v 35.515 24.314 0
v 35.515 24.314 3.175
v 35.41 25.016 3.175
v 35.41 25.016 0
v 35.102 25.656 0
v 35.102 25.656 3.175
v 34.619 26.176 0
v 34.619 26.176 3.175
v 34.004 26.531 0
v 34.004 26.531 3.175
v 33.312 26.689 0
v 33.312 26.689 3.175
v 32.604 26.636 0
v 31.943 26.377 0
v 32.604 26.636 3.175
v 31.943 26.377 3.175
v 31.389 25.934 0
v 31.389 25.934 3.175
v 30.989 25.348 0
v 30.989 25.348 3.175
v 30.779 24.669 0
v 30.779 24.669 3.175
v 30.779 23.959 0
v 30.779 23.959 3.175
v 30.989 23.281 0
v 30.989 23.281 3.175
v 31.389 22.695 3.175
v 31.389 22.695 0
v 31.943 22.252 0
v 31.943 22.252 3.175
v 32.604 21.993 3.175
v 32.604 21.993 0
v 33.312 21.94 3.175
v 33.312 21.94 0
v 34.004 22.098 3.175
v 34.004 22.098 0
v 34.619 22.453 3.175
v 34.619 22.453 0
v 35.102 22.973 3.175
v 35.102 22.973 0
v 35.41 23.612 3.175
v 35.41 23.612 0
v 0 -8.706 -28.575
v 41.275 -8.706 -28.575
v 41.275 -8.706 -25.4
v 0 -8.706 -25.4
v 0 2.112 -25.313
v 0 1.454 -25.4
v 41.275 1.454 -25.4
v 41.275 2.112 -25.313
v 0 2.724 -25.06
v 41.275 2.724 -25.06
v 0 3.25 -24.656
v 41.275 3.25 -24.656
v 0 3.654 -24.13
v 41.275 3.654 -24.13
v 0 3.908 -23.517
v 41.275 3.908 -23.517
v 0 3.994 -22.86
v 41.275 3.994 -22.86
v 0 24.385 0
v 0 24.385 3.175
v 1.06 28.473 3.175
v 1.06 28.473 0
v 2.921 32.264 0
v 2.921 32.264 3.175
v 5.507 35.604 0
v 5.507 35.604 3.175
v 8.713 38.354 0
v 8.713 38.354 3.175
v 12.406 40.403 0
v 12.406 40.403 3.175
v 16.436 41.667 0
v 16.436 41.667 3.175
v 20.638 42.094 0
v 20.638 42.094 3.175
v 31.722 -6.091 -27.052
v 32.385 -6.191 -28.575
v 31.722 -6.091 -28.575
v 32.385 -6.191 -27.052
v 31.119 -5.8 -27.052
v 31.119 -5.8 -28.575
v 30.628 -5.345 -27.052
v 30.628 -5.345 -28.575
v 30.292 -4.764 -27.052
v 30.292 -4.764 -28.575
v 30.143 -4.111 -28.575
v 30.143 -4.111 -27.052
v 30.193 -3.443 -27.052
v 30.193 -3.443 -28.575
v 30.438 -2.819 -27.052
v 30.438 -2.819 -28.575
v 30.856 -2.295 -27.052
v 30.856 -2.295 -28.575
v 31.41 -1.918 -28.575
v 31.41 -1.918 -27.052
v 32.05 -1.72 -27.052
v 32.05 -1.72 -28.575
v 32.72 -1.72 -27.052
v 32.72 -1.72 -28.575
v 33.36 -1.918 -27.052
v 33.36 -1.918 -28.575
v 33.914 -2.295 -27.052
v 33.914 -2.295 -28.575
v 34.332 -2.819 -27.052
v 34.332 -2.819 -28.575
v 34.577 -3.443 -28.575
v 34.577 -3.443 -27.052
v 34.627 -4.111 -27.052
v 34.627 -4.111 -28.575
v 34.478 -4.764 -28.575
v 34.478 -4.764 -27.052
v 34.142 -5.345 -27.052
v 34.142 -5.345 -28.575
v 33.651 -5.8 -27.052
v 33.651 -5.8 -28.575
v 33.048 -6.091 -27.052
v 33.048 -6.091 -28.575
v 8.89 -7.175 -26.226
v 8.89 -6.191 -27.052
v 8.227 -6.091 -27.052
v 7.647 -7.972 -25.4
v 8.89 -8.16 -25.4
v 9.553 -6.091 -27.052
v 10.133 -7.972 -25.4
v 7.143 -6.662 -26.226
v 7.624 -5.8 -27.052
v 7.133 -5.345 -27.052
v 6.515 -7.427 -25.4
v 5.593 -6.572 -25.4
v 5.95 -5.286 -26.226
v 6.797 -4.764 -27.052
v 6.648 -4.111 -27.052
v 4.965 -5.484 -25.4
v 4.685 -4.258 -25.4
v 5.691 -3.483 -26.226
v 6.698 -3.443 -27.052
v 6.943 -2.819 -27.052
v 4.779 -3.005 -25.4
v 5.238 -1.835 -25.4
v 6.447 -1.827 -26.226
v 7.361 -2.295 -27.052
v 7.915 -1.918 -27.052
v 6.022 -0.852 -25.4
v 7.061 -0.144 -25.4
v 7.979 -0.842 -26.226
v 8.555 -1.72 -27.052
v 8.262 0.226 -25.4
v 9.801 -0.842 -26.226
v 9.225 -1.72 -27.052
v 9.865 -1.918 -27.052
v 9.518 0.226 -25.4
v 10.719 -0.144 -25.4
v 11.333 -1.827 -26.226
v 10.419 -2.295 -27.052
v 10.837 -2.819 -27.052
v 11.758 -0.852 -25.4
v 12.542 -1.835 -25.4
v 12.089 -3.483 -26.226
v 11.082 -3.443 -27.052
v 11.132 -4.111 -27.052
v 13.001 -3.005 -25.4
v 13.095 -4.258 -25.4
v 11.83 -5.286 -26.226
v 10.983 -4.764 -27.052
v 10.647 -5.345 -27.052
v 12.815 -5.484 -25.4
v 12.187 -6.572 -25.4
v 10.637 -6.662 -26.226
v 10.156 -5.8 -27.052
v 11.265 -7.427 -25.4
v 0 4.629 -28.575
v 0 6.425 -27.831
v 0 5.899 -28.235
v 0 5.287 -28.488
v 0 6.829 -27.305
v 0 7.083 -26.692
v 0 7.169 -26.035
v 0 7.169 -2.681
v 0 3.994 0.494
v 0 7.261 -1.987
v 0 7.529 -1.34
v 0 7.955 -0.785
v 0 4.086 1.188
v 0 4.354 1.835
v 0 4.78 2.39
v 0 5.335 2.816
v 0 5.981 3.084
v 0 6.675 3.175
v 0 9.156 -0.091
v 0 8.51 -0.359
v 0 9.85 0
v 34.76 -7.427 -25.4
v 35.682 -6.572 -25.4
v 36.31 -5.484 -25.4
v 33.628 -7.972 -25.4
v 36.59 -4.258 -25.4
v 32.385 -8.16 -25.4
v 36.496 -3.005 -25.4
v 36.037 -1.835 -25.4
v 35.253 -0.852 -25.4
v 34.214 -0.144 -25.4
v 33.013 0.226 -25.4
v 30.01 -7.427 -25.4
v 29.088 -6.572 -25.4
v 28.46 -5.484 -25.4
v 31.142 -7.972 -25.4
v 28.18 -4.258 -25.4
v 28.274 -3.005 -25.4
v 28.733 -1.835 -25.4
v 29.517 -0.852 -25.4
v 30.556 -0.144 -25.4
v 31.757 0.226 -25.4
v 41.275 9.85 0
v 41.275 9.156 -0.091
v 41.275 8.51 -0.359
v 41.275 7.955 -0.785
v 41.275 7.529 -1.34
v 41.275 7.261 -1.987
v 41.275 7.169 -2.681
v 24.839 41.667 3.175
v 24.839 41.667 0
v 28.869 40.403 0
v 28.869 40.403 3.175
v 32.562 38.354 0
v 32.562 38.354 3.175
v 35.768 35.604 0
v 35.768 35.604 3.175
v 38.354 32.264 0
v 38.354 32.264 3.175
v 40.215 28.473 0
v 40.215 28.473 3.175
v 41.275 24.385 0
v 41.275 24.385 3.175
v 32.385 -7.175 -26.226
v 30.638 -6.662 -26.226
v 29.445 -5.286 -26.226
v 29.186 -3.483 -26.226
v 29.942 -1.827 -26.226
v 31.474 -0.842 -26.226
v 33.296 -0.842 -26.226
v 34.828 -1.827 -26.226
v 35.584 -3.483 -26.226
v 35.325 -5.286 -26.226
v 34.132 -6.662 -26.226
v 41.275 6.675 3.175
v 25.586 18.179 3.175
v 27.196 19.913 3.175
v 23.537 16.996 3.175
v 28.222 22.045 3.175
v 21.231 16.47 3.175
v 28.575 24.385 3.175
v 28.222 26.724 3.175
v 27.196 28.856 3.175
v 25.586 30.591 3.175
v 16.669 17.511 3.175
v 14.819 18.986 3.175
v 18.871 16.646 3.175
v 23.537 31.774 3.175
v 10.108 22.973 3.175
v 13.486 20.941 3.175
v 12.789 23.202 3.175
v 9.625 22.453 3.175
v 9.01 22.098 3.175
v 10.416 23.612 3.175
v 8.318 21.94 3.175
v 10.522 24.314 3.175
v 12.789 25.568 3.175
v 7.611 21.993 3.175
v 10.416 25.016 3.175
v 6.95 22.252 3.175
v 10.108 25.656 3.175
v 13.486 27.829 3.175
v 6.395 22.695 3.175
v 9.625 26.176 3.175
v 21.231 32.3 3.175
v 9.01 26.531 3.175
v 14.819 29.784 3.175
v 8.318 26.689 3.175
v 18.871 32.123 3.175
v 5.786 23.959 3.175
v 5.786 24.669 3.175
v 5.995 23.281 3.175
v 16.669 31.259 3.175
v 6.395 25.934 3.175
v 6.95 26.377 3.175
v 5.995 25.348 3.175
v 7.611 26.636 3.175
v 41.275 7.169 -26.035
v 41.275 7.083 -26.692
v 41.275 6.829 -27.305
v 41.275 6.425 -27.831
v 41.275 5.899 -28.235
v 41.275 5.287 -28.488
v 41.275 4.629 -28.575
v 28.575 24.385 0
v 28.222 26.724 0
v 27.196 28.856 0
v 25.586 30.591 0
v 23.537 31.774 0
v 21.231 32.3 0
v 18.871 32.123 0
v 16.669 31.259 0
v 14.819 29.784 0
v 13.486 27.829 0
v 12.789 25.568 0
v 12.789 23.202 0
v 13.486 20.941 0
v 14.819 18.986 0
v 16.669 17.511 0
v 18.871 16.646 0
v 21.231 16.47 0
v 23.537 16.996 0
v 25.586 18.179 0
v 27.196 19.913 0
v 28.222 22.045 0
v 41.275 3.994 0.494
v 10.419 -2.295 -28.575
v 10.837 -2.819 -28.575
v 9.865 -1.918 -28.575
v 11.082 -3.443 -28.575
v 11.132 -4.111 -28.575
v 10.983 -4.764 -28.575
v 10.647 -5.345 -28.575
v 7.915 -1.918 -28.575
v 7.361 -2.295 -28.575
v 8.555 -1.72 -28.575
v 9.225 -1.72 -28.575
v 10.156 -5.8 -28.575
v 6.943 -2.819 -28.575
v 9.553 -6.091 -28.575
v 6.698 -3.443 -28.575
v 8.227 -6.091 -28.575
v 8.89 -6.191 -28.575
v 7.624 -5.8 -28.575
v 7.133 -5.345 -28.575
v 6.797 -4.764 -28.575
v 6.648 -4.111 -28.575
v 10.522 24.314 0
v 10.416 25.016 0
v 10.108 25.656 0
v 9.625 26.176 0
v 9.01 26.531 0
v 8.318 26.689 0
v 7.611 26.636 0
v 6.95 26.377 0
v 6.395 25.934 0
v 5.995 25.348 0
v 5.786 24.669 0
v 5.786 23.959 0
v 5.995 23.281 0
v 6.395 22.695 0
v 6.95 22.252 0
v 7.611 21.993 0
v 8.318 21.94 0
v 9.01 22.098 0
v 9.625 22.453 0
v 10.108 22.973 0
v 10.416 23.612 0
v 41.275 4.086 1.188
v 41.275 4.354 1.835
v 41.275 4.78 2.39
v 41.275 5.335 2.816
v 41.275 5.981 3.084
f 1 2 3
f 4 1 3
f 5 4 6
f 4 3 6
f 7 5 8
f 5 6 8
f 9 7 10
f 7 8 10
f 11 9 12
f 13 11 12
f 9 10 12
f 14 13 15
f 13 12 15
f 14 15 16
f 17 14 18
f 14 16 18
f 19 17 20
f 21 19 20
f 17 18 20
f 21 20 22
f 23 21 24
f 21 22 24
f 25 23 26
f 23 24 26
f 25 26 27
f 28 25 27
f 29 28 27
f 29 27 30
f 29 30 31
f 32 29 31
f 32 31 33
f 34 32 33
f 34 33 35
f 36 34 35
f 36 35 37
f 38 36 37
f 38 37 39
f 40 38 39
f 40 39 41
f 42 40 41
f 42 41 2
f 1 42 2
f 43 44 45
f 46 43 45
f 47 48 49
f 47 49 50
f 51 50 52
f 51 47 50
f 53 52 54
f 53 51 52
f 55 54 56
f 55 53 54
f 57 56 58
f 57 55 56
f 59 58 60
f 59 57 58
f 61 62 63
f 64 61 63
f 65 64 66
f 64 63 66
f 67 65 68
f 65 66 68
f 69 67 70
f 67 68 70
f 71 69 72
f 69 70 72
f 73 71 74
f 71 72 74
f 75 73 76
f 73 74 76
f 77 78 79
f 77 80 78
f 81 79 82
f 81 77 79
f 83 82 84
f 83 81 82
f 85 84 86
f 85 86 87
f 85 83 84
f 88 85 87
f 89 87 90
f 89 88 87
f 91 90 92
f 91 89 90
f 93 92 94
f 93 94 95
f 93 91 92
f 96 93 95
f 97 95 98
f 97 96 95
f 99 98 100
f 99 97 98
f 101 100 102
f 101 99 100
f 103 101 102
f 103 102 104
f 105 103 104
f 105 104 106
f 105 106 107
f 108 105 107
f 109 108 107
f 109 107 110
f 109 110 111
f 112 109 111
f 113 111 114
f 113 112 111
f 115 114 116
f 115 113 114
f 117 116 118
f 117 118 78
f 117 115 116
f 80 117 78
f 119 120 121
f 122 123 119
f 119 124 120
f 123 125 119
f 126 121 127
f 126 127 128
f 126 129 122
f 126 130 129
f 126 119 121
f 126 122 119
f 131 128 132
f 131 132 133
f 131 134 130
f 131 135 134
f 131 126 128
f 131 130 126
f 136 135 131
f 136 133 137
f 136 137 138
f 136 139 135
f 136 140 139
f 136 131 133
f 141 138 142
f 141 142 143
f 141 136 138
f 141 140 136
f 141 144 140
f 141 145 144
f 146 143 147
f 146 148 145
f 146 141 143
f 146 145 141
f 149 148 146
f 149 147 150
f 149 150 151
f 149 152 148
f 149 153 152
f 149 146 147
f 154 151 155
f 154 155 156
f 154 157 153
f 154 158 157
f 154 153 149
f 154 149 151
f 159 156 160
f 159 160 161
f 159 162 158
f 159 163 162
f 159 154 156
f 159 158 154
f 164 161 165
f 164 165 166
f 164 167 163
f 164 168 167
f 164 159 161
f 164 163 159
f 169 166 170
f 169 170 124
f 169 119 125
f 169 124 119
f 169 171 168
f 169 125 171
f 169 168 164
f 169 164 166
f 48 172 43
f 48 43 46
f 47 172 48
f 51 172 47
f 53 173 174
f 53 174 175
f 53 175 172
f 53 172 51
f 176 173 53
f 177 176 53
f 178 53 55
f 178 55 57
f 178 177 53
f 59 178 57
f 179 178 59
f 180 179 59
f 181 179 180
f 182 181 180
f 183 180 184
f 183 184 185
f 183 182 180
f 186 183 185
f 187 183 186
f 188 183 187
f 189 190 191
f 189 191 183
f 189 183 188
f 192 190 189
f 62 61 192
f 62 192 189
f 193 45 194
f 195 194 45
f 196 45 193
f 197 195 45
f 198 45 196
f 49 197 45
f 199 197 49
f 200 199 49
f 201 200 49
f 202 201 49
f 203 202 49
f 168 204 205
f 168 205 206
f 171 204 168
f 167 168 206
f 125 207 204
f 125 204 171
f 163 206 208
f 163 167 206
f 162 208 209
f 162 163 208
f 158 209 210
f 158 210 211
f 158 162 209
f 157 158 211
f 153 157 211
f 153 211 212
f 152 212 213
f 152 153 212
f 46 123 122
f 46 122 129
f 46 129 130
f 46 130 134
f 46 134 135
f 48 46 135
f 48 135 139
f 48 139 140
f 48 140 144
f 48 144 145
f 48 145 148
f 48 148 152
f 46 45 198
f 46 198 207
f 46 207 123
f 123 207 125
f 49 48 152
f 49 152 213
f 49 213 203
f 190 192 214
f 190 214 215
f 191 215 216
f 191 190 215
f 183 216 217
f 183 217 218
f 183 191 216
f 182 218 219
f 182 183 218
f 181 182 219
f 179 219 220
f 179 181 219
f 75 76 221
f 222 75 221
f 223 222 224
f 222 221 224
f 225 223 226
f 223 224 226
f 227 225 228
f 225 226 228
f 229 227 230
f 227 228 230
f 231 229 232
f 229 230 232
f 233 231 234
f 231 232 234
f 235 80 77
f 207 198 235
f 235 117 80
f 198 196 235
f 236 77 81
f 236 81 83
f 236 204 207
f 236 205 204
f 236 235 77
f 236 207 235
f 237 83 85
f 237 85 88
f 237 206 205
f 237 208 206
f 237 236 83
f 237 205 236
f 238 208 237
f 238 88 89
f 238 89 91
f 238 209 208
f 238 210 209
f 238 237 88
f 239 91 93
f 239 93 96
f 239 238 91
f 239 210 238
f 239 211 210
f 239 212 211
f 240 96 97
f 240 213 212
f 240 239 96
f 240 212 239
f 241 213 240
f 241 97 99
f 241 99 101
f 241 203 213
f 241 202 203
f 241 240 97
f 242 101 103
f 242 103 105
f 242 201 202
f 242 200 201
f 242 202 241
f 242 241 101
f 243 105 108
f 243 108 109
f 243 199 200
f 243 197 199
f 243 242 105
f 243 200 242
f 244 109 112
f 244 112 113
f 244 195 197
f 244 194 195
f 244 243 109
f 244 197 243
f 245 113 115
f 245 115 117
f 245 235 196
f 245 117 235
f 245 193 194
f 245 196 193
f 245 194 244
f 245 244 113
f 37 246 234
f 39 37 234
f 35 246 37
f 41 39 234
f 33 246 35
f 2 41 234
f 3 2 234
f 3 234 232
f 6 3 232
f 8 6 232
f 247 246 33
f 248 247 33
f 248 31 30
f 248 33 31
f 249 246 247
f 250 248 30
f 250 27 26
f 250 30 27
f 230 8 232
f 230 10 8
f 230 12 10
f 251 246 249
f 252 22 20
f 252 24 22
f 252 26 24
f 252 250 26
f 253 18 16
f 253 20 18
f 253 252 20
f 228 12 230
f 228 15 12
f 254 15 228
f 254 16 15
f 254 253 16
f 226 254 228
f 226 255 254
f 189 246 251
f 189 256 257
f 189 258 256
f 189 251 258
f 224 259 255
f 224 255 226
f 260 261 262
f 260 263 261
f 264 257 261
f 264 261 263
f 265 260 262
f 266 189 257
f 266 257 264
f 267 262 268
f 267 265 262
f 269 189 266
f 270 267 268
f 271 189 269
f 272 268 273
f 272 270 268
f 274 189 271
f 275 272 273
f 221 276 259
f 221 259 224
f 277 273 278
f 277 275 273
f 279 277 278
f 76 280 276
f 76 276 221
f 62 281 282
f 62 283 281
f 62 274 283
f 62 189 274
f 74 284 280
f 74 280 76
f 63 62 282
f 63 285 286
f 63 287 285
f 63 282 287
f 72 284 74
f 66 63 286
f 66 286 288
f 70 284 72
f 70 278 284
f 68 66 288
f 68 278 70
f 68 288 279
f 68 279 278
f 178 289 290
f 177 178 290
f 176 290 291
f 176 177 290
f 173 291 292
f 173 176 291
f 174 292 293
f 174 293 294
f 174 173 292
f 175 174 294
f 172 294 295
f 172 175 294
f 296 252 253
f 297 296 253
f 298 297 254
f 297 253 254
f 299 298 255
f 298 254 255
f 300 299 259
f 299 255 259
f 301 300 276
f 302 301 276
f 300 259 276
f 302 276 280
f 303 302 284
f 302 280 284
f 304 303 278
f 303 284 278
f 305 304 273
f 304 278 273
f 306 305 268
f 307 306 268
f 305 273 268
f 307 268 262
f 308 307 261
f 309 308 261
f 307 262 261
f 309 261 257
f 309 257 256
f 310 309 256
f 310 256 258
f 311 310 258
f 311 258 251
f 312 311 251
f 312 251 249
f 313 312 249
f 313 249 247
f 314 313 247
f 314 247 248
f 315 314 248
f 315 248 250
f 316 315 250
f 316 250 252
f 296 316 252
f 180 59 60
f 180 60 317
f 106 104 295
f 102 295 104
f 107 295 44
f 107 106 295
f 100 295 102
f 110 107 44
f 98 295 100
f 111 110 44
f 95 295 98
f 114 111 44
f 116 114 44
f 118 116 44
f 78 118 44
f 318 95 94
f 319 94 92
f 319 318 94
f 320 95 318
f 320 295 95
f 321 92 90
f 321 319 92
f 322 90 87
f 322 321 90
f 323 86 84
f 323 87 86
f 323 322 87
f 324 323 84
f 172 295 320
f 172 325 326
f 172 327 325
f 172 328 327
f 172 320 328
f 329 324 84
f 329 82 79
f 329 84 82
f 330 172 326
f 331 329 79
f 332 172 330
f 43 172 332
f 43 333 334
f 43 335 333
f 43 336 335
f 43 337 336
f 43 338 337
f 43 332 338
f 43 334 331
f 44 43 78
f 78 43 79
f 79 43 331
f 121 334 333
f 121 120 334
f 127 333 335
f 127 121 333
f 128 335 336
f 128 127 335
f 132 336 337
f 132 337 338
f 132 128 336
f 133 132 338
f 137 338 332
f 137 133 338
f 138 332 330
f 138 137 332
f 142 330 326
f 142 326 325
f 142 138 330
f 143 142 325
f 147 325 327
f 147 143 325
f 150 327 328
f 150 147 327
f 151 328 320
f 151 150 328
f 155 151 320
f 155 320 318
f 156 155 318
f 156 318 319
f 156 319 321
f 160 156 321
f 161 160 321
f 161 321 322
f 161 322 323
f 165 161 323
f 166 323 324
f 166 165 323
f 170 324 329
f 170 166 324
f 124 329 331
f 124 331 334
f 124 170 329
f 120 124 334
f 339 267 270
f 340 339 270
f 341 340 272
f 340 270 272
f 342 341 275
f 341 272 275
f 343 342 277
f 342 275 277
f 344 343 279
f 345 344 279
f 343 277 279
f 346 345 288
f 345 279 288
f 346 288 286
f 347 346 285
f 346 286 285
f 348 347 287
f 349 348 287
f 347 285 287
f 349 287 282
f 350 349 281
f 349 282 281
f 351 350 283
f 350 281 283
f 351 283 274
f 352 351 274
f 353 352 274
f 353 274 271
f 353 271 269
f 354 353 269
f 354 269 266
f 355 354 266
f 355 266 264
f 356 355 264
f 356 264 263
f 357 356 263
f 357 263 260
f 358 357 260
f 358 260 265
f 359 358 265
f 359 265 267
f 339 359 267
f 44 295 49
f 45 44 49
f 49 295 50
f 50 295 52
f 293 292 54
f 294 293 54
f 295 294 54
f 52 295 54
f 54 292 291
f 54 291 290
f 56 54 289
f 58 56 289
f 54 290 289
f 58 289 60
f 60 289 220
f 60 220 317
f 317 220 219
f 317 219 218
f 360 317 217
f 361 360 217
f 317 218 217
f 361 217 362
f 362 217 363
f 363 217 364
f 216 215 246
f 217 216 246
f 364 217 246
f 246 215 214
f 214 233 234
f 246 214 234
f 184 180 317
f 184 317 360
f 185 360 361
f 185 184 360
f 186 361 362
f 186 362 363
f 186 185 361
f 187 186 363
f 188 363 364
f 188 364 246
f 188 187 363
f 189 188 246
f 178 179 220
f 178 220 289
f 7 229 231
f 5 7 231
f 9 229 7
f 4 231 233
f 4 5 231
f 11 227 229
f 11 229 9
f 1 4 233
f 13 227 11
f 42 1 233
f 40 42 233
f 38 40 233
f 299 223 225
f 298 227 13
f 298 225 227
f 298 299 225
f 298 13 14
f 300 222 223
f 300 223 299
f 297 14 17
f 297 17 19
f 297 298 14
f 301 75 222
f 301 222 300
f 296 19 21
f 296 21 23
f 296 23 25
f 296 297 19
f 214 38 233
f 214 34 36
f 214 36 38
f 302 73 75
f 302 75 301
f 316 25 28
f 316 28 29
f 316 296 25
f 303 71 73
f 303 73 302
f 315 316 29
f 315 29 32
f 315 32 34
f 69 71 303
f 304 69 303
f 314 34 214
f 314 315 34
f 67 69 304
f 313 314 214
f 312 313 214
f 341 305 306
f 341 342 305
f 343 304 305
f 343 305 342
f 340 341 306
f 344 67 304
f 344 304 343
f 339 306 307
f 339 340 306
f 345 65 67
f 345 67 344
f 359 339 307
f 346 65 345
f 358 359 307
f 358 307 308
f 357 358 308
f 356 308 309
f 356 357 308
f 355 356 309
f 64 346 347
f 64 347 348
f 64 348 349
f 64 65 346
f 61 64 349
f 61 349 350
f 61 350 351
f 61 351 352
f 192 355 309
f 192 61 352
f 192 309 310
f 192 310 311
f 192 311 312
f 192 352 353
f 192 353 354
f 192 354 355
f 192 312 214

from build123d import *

# Parameters (mm, degrees)
BOSS_EXTRUDE1_DEPTH                       = 41.275
SKETCH3_R                                 = 7.9375
CUT_EXTRUDE2_DEPTH                        = 6.35
SKETCH4_R                                 = 2.38125
CUT_EXTRUDE3_DEPTH                        = 67.959870826
CSK_FOR_8_FLAT_HEAD_MACHINE_SCREW_2_COUNT = 2
CSK_FOR_8_FLAT_HEAD_MACHINE_SCREW_2_PITCH = 23.495


with BuildPart() as part:
    # Sketch1 → Boss-Extrude1 (new body)
    with BuildSketch(Plane(origin=(0, 0, 0), x_dir=(0, 0, -1), z_dir=(1, 0, 0))):
        with BuildLine():
            Line((0, 42.094372261), (0, 9.850328802))
            ThreePointArc((0, 9.850328802), (0.785233991, 7.954606252), (2.680956542, 7.169372261))
            Line((2.680956542, 7.169372261), (26.035, 7.169372261))
            ThreePointArc((26.035, 7.169372261), (27.831051224, 6.425423485), (28.575, 4.629372261))
            Line((28.575, 4.629372261), (28.575, -8.705627739))
            Line((28.575, -8.705627739), (25.4, -8.705627739))
            Line((25.4, -8.705627739), (25.4, 1.454372261))
            ThreePointArc((25.4, 1.454372261), (24.656051224, 3.250423485), (22.86, 3.994372261))
            Line((22.86, 3.994372261), (-0.494043458, 3.994372261))
            ThreePointArc((-0.494043458, 3.994372261), (-2.389766009, 4.779606252), (-3.175, 6.675328802))
            Line((-3.175, 6.675328802), (-3.175, 42.094372261))
            Line((-3.175, 42.094372261), (0, 42.094372261))
        make_face()
    extrude(amount=BOSS_EXTRUDE1_DEPTH)

    # Sketch3 → Cut-Extrude2 (cut)
    with BuildSketch(Plane.XY.offset(3.175)):
        with Locations((20.6375, 24.384850532)):
            Circle(SKETCH3_R)
    extrude(amount=-CUT_EXTRUDE2_DEPTH, mode=Mode.SUBTRACT)

    # Sketch4 → Cut-Extrude3 (cut, through all)
    with BuildSketch(Plane.XY.offset(3.175)):
        with BuildLine():
            Line((0, 42.094372261), (0, 24.384850532))
            ThreePointArc((0, 24.384850532), (7.04031678, 37.060079652), (20.6375, 42.094372261))
            Line((20.6375, 42.094372261), (0, 42.094372261))
        make_face()
        with BuildLine():
            Line((41.275, 42.094372261), (20.6375, 42.094372261))
            ThreePointArc((20.6375, 42.094372261), (34.23468322, 37.060079652), (41.275, 24.384850532))
            Line((41.275, 24.384850532), (41.275, 42.094372261))
        make_face()
        with Locations((8.14050126, 24.314372261)):
            Circle(SKETCH4_R)
        with Locations((33.13410126, 24.314372261)):
            Circle(SKETCH4_R)
    extrude(amount=-CUT_EXTRUDE3_DEPTH, mode=Mode.SUBTRACT)

    # Sketch10 → CSK for #8 Flat Head Machine Screw (100)2 (revolve, cut)
    with BuildSketch(Plane(origin=(8.89, -3.943127739, -25.4), x_dir=(0, -1, 0), z_dir=(1, 0, 0))):
        Polygon((0, 0), (0, 3.175), (2.2479, 3.175), (2.2479, 1.651767624), (4.2164, 0), align=None)
    csk_for_8_flat_head_machine_screw_100 = revolve(axis=Axis((8.89, -3.943127739, -19.05), (0, 0, -1)), mode=Mode.SUBTRACT)

    # CSK for _8 Flat Head Machine Screw _ 2: CSK for #8 Flat Head Machine Screw (100)2 ×2
    with Locations(*[(i * CSK_FOR_8_FLAT_HEAD_MACHINE_SCREW_2_PITCH, 0, 0) for i in range(1, CSK_FOR_8_FLAT_HEAD_MACHINE_SCREW_2_COUNT)]):
        add(csk_for_8_flat_head_machine_screw_100, mode=Mode.SUBTRACT)


solid = part.part
